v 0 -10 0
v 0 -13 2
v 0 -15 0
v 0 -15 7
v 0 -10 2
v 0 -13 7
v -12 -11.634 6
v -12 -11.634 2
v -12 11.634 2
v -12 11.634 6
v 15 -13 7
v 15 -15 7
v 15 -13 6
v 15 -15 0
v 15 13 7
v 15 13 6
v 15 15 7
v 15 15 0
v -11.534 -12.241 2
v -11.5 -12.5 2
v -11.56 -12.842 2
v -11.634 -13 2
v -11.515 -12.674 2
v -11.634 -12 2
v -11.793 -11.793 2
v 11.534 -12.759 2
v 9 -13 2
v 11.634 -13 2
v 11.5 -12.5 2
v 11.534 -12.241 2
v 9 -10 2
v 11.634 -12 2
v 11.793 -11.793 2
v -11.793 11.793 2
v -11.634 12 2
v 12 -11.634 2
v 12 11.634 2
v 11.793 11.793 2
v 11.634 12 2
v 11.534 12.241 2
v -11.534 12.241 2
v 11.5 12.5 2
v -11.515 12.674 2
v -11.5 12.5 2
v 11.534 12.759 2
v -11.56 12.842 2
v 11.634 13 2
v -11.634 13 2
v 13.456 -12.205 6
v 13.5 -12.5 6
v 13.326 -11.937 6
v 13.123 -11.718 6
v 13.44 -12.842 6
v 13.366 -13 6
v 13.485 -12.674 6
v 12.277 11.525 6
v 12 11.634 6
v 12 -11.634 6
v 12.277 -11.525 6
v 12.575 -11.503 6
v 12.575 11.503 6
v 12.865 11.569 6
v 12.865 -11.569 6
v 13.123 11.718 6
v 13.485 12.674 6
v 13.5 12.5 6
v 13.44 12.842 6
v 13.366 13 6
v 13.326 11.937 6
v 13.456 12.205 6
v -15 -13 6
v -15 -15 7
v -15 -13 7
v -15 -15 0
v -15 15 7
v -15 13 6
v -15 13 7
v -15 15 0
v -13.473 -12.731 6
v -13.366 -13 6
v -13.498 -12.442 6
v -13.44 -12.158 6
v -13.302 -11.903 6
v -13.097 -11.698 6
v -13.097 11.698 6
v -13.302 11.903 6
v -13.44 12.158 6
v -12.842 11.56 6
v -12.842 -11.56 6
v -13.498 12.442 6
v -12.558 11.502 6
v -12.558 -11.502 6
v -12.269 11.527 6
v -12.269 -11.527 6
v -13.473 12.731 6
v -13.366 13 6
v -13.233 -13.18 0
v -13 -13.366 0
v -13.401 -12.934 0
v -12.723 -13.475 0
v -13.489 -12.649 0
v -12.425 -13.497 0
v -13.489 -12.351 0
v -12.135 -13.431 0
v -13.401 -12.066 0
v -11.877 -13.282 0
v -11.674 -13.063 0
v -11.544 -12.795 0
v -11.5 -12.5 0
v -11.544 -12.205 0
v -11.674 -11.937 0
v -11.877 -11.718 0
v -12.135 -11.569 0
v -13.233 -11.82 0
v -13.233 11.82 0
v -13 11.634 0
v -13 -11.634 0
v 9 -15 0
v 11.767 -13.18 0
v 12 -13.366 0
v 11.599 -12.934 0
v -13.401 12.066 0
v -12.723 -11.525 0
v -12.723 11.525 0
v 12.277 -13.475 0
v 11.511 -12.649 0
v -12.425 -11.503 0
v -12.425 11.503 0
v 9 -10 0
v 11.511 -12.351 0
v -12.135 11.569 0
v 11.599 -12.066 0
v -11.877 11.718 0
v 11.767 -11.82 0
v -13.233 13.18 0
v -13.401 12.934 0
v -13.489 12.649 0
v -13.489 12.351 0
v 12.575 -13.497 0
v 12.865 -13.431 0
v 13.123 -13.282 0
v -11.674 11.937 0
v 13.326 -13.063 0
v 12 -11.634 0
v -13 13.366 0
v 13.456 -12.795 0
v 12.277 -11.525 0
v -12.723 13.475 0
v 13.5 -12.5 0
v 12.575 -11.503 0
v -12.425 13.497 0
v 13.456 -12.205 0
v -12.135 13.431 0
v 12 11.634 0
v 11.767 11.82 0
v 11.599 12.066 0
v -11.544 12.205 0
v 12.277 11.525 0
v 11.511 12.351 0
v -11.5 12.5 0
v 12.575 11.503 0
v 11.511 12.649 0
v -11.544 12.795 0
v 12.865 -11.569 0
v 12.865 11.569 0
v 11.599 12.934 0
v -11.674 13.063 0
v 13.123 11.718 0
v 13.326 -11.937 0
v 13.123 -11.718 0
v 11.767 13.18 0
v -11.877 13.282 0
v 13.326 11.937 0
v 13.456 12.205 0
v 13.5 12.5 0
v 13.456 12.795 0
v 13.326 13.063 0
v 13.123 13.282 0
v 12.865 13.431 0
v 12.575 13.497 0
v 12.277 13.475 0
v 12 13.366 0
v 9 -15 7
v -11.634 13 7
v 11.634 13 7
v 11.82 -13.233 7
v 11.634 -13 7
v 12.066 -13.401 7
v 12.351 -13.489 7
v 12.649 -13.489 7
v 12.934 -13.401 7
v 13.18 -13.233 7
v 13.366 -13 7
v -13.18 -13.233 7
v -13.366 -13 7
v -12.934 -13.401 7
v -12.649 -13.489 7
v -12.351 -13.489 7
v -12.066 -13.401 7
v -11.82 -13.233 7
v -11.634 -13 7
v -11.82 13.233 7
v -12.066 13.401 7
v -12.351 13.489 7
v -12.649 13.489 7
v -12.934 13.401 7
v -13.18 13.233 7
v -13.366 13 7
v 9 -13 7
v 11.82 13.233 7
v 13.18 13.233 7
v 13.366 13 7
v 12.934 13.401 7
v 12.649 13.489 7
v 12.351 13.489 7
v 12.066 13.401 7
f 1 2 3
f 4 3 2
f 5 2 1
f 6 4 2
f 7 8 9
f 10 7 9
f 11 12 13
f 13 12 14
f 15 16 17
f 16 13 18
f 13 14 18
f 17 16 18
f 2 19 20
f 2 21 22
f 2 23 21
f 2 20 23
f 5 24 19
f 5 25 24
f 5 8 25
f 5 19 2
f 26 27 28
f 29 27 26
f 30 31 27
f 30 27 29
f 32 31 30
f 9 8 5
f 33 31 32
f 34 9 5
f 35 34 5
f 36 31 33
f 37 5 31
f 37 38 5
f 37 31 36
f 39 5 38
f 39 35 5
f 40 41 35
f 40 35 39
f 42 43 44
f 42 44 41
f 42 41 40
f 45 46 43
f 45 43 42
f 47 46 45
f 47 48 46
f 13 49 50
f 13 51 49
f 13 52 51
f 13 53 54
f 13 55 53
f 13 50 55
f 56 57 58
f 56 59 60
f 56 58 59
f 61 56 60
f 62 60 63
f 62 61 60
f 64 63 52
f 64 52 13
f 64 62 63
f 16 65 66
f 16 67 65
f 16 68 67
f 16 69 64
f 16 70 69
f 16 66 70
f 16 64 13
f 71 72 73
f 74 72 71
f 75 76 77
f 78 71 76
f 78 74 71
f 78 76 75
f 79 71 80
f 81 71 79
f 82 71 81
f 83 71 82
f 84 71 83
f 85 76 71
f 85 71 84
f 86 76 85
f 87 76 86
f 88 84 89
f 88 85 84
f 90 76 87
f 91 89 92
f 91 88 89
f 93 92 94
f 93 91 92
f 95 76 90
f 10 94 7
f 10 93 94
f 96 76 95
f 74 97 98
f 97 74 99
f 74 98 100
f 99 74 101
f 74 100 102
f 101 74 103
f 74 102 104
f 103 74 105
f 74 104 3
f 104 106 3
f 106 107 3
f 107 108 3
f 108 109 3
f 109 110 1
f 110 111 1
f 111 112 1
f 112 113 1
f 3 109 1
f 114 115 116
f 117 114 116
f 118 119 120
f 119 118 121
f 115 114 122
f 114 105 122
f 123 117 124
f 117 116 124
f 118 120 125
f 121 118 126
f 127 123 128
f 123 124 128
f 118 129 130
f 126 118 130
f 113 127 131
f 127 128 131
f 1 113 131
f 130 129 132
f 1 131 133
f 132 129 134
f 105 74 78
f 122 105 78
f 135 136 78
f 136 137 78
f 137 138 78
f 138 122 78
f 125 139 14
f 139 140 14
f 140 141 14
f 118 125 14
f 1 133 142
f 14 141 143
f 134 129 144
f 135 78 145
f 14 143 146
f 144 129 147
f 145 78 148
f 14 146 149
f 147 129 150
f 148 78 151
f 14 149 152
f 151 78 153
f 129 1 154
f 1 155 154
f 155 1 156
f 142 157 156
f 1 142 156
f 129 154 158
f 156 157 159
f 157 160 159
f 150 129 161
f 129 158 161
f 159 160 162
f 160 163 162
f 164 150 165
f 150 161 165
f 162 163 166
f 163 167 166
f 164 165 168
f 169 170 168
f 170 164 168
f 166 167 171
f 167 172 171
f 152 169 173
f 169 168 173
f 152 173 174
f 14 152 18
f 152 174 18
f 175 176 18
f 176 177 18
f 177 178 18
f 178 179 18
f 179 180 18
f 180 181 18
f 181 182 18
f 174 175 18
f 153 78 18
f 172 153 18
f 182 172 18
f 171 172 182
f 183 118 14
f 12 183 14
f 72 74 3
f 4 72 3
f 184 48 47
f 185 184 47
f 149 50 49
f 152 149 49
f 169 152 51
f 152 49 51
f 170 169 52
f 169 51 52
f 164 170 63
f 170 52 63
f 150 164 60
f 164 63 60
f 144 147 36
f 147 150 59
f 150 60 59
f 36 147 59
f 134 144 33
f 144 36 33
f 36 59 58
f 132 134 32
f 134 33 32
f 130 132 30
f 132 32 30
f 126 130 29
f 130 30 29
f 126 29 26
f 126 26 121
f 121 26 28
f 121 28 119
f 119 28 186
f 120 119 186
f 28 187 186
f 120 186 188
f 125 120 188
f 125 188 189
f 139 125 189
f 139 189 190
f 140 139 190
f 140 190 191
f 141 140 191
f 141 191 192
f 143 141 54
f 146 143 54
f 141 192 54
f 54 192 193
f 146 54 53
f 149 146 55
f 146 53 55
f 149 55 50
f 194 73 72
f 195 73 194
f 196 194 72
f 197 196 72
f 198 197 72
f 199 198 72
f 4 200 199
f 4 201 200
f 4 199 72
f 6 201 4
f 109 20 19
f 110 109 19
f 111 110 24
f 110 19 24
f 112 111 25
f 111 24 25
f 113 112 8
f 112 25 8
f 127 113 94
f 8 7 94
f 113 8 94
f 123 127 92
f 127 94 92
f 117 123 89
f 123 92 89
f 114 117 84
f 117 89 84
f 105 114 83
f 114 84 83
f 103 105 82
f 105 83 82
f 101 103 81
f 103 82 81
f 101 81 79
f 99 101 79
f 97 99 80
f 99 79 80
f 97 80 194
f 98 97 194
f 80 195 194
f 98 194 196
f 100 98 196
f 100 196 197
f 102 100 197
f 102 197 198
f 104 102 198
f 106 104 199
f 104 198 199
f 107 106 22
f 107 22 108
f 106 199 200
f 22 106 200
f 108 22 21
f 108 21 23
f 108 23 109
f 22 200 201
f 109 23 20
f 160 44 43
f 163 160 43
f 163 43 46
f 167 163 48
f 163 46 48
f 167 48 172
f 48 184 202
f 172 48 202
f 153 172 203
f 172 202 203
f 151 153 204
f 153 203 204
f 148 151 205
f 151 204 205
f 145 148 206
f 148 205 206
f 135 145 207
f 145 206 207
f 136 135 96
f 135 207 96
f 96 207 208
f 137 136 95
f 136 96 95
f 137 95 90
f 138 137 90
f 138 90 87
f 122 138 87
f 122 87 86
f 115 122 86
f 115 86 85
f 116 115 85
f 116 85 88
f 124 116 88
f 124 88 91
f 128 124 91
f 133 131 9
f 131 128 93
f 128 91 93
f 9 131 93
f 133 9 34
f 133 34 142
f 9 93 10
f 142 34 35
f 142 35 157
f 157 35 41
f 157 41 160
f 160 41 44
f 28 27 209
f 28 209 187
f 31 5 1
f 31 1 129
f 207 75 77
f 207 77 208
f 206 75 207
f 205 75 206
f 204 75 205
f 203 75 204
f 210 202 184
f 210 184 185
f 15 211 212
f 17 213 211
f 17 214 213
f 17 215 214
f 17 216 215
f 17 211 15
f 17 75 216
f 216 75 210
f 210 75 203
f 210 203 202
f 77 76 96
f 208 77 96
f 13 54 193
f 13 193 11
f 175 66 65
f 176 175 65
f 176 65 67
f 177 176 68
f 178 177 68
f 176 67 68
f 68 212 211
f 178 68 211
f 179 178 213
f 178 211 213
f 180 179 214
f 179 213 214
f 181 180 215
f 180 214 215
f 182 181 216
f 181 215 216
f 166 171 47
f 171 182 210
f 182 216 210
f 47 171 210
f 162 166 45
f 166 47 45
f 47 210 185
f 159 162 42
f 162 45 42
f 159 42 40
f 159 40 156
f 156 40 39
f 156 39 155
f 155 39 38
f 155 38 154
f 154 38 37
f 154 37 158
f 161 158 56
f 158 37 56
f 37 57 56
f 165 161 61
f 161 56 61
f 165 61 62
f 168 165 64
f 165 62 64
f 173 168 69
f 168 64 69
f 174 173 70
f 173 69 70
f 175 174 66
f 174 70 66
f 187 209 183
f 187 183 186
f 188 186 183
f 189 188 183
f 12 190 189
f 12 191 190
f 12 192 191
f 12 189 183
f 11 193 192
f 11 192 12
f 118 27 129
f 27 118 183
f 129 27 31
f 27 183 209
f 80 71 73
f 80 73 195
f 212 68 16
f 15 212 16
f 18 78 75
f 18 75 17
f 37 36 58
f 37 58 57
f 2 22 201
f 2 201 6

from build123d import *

# Parameters (mm, degrees)
SKETCH_W     = 30
SKETCH_H     = 30
PAD_DEPTH    = 2
SKETCH001_W  = 3
SKETCH001_H  = 26
PAD001_DEPTH = 4
SKETCH002_W  = 30
SKETCH002_H  = 2
PAD002_DEPTH = 5
SKETCH003_R  = 1
SKETCH003_W  = 9
SKETCH003_H  = 5
POCKET_DEPTH = 10


with BuildPart() as part:
    # Sketch → Pad (new body)
    with BuildSketch(Plane.XY):
        Rectangle(SKETCH_W, SKETCH_H)
    extrude(amount=PAD_DEPTH)

    # Sketch001 (on Face6 of Pad) → Pad001 (join)
    with BuildSketch(Plane.XY.offset(2)):
        with Locations((-13.5, 0)):
            Rectangle(SKETCH001_W, SKETCH001_H)
        with Locations((13.5, 0)):
            Rectangle(SKETCH001_W, SKETCH001_H)
    extrude(amount=PAD001_DEPTH)

    # Sketch002 (on Face5 of Pad001) → Pad002 (join)
    with BuildSketch(Plane.XY.offset(2)):
        with Locations((0, -14)):
            Rectangle(SKETCH002_W, SKETCH002_H)
        with Locations((0, 14)):
            Rectangle(SKETCH002_W, SKETCH002_H)
    extrude(amount=PAD002_DEPTH)

    # Sketch003 (on Face16 of Pad002) → Pocket (cut)
    with BuildSketch(Plane.XY.offset(7)):
        with Locations((-12.5, 12.5)):
            Circle(SKETCH003_R)
        with Locations((-12.5, -12.5)):
            Circle(SKETCH003_R)
        with Locations((12.5, -12.5)):
            Circle(SKETCH003_R)
        with Locations((12.5, 12.5)):
            Circle(SKETCH003_R)
        with Locations((4.5, -12.5)):
            Rectangle(SKETCH003_W, SKETCH003_H)
    extrude(amount=-POCKET_DEPTH, mode=Mode.SUBTRACT)


solid = part.part
